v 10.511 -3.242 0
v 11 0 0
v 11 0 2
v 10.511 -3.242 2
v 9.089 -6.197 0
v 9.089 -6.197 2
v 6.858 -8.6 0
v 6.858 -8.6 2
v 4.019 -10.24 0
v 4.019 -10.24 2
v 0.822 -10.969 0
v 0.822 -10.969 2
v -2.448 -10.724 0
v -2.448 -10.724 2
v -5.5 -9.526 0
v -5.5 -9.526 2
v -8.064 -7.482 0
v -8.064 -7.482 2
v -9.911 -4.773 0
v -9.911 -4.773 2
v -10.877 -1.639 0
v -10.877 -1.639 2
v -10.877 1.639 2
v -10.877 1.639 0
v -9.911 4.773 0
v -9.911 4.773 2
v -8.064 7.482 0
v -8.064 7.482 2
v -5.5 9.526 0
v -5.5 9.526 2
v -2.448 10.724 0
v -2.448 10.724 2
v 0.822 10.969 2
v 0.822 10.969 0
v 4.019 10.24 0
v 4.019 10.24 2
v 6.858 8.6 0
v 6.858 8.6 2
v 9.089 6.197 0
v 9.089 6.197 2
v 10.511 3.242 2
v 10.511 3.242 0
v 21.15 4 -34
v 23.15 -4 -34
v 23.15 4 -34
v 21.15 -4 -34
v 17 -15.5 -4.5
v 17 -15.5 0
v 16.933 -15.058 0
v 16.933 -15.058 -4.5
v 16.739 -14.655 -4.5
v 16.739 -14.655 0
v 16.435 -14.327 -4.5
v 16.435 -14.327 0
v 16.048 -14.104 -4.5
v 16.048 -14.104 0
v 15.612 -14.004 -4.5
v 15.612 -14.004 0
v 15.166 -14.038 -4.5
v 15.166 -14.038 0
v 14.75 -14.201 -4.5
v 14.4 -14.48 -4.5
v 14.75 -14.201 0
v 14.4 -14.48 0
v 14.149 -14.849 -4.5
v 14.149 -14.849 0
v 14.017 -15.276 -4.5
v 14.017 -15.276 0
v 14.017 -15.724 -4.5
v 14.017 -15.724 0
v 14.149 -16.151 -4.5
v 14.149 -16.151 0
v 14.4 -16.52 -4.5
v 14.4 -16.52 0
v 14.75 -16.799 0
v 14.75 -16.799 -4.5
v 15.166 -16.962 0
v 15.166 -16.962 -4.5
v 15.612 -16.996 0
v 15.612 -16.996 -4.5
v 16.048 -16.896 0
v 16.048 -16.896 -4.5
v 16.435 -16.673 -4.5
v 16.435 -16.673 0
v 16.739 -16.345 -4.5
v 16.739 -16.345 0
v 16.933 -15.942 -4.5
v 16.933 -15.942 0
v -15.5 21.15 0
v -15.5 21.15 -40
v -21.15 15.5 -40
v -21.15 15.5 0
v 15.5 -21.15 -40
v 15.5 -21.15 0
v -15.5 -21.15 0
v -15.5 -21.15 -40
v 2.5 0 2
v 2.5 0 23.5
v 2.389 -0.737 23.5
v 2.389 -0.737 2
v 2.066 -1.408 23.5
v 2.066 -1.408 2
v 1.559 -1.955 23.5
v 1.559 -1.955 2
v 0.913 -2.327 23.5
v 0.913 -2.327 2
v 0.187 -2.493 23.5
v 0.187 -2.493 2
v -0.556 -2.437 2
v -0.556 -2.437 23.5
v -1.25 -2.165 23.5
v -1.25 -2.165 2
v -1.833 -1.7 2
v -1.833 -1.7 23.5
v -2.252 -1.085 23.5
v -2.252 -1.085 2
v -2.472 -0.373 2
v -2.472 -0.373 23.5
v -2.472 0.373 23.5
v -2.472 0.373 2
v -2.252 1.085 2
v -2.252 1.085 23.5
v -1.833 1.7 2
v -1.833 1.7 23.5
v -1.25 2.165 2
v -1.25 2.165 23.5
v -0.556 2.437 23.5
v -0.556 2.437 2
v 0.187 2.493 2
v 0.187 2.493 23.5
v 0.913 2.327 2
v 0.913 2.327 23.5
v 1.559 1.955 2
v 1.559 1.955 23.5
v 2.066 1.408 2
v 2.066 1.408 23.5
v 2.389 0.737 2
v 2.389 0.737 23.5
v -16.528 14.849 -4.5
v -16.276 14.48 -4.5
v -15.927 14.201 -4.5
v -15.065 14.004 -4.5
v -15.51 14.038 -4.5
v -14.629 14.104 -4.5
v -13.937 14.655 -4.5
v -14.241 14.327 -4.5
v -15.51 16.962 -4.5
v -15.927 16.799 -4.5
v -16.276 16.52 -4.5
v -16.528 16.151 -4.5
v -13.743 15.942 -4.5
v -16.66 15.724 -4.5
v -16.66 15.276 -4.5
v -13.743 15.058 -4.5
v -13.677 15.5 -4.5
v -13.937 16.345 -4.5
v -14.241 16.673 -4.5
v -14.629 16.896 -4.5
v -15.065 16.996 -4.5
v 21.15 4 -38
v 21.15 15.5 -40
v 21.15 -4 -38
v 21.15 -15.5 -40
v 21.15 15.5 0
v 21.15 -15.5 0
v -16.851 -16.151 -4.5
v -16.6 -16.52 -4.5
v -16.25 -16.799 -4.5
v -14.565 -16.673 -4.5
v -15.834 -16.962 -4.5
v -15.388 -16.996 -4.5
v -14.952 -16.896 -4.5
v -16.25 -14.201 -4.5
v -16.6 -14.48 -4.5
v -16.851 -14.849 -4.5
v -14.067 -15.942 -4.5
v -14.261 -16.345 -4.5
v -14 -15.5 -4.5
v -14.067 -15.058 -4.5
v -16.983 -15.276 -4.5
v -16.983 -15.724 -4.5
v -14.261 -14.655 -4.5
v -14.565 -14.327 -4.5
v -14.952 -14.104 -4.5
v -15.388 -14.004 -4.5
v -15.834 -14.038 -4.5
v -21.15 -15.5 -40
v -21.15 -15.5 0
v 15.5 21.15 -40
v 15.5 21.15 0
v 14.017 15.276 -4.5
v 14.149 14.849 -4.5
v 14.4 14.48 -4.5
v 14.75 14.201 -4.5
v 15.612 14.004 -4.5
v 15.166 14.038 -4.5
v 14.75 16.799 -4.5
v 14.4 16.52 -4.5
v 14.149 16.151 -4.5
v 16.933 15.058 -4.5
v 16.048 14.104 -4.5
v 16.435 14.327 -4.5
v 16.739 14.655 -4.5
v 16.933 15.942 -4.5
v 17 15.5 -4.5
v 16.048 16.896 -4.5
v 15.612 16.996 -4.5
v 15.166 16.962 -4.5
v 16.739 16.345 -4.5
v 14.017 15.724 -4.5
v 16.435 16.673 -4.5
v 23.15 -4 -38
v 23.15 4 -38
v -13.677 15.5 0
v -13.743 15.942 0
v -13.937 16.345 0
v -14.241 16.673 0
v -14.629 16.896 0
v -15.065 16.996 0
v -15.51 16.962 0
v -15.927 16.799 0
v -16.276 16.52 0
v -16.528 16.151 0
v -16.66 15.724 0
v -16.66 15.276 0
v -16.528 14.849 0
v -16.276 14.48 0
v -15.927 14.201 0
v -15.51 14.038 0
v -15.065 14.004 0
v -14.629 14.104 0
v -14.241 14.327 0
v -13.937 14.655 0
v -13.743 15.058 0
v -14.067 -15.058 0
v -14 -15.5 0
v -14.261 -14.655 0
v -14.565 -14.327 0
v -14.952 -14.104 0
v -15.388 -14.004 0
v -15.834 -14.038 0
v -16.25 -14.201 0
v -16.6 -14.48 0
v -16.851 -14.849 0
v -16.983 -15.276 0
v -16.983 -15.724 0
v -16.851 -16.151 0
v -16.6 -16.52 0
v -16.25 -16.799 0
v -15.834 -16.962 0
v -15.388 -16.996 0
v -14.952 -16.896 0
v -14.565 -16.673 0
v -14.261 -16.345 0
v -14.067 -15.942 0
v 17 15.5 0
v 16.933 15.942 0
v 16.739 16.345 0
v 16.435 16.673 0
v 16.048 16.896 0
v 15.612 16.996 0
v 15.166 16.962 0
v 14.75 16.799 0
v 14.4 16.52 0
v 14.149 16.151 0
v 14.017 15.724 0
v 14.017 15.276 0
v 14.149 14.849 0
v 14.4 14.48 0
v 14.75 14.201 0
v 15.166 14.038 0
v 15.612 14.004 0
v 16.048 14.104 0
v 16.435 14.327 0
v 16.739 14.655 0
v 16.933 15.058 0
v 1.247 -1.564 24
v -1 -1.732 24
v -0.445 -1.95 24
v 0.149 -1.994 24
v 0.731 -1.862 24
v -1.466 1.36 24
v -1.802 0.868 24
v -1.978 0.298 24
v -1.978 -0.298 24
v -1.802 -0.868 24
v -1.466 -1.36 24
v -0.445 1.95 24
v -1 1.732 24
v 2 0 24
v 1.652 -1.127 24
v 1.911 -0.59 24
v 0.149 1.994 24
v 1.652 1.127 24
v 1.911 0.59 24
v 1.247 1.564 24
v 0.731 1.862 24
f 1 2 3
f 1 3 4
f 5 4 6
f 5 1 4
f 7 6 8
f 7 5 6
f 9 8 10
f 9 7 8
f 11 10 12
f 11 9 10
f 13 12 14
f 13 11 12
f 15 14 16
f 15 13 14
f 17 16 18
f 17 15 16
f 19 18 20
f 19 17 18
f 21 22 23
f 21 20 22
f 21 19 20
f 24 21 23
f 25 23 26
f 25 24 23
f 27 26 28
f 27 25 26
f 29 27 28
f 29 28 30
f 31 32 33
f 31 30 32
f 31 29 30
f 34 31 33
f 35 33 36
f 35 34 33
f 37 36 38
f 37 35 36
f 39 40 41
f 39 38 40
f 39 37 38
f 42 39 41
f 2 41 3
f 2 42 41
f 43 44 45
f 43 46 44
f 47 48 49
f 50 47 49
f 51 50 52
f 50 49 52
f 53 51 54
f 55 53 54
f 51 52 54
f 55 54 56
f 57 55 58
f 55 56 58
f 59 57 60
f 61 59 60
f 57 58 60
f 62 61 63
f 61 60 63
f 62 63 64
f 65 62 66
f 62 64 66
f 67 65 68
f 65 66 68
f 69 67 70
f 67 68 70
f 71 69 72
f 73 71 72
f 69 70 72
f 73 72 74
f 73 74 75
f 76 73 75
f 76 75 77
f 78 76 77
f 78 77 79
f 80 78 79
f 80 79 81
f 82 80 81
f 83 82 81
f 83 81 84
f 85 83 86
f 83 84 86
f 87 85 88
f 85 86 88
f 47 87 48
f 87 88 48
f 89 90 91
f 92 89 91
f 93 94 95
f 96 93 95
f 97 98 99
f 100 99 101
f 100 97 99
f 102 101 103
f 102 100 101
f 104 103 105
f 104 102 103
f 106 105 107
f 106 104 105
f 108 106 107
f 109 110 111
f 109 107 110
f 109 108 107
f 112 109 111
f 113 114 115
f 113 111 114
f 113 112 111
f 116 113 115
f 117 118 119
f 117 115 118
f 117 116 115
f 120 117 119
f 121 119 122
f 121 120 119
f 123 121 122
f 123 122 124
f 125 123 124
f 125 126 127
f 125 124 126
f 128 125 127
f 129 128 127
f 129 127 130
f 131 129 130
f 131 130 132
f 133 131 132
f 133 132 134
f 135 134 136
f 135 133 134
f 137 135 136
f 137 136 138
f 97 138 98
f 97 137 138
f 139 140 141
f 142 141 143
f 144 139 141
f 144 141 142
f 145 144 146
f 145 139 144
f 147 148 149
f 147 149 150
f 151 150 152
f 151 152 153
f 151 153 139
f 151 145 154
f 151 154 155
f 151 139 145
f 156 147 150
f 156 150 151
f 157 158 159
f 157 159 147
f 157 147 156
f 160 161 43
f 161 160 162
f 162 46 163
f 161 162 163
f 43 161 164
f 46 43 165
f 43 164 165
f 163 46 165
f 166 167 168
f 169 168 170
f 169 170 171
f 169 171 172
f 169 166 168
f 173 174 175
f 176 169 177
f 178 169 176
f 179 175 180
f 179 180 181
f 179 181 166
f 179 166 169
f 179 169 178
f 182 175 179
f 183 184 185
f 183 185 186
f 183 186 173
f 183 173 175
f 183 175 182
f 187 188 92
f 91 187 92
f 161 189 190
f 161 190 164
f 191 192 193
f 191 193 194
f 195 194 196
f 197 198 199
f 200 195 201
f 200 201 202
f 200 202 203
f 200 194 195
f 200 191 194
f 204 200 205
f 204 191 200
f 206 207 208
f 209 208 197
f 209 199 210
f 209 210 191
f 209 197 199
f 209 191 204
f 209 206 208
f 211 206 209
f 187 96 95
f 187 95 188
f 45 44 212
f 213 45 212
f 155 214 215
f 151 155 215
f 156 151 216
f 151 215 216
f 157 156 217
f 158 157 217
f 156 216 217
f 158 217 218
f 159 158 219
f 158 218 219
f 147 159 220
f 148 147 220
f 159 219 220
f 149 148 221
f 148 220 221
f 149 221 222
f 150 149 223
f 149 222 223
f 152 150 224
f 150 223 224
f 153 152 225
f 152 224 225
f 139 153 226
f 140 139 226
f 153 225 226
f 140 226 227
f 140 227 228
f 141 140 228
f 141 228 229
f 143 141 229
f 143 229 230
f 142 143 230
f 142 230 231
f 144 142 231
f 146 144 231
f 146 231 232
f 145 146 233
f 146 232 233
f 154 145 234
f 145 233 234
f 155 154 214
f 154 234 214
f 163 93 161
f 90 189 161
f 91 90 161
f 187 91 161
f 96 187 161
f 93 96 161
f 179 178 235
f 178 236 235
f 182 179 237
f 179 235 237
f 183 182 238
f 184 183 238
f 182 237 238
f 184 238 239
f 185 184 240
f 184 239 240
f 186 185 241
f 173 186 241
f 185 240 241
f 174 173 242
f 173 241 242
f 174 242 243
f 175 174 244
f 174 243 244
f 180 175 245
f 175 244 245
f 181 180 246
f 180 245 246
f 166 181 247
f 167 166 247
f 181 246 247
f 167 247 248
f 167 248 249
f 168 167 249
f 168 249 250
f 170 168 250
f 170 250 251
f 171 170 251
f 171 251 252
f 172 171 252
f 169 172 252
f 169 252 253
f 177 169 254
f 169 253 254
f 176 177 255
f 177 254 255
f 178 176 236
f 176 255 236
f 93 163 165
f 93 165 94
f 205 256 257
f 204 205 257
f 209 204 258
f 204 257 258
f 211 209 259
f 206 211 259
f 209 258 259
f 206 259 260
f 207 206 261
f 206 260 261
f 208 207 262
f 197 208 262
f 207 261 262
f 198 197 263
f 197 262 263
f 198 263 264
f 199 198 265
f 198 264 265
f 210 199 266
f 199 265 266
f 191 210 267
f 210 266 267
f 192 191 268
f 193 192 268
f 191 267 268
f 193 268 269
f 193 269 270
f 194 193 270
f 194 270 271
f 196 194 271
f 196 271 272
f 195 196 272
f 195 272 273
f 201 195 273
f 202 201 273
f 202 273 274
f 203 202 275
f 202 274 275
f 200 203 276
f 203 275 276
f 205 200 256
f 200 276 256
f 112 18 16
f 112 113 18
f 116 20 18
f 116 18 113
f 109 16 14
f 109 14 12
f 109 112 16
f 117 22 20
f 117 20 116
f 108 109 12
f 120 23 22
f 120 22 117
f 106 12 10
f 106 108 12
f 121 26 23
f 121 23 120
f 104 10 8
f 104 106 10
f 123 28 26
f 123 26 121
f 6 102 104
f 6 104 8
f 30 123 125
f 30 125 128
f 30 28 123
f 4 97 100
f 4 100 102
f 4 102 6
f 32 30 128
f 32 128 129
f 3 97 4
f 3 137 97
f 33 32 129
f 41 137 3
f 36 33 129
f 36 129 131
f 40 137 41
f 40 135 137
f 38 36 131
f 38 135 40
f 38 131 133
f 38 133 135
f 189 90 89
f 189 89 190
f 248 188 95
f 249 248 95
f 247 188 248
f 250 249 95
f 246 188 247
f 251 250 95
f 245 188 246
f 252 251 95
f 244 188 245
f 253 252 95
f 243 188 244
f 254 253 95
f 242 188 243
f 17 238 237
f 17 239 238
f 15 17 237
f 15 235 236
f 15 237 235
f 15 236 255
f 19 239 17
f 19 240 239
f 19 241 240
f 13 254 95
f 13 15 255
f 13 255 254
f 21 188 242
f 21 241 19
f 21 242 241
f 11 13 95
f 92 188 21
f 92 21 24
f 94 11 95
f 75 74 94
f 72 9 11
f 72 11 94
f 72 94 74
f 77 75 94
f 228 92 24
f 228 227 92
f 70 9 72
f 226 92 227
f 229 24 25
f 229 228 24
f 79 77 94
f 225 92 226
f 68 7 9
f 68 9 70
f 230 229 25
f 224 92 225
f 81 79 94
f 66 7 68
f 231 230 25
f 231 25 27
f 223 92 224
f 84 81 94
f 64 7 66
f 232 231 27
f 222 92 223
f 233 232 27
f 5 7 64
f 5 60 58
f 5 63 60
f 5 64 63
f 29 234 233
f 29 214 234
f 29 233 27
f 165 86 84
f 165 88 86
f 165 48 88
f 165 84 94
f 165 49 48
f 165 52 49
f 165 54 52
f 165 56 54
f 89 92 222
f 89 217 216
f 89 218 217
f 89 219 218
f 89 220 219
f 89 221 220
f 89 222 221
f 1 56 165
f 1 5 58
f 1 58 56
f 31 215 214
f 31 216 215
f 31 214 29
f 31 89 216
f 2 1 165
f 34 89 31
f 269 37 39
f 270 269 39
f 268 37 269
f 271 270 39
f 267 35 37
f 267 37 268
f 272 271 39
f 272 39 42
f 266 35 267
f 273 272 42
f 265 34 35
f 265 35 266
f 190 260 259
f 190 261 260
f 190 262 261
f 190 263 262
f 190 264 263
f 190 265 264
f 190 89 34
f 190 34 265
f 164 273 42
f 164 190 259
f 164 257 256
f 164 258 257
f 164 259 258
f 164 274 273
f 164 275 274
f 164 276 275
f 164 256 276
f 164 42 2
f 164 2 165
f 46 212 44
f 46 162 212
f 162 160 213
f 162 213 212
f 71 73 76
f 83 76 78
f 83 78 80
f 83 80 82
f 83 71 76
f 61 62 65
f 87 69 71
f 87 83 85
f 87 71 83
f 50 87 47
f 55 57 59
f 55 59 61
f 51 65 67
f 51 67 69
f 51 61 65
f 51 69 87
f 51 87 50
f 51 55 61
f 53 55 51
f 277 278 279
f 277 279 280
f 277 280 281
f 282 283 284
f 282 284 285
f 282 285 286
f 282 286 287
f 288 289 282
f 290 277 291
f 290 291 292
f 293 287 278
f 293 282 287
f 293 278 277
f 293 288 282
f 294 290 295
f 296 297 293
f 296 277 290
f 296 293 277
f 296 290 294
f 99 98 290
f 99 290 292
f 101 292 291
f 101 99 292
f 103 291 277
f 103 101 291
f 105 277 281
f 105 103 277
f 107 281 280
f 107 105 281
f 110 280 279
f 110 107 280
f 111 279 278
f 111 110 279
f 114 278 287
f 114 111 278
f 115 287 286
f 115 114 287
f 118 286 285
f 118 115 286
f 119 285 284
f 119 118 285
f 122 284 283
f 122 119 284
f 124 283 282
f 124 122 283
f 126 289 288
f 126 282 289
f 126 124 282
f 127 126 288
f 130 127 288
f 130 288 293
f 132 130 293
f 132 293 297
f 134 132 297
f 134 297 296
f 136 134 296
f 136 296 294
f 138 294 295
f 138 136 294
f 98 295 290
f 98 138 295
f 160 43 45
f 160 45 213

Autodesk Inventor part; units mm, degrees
ref_plane "YZ Plane" through (0, 0, 0) normal (1, 0, 0) x (0, 1, 0)
ref_plane "XZ Plane" through (0, 0, 0) normal (0, 1, 0) x (-1, 0, 0)
ref_plane "XY Plane" through (0, 0, 0) normal (0, 0, 1) x (1, 0, 0)
sketch "Sketch1" plane through (0, 0, 0) normal (0, 0, 1) x (1, 0, 0)
  line L0 (15.5, -21.15) -> (-15.5, -21.15)
  line L1 (-21.15, -15.5) -> (-21.15, 15.5)
  line L2 (-15.5, 21.15) -> (15.5, 21.15)
  line L3 (21.15, 15.5) -> (21.15, -15.5)
  line L4 (21.15, -21.15) -> (-21.15, 21.15) construction
  line L5 (-21.15, -21.15) -> (21.15, 21.15) construction
  line L6 (-15.5, 21.15) -> (-21.15, 15.5)
  line L7 (-21.15, 0) -> (-21.15, 15.5)
  line L8 (0, 21.15) -> (-15.5, 21.15)
  line L9 (15.5, 21.15) -> (21.15, 15.5)
  line L10 (21.15, -15.5) -> (15.5, -21.15)
  line L11 (-15.5, -21.15) -> (-21.15, -15.5)
  point P0 (0, 0)
  dimension "d0" = 42.3
  dimension "d1" = 42.3
  dimension "d2" = 5.65
  dimension "d3" = 5.65
  dimension "d4" = 15.5
  dimension "d5" = 15.5
extrude "Extrusion1" add sketch "Sketch1" against normal blind 40
sketch "Sketch2" plane through (0, 0, 0) normal (0, 0, 1) x (1, 0, 0)
  circle A0 centre (0, 0) radius 11
  dimension "d8" = 22
extrude "Extrusion2" add sketch "Sketch2" along normal blind 2
sketch "Sketch3" plane through (0, 0, 0) normal (0, 0, 1) x (1, 0, 0)
  circle A0 centre (0, 0) radius 2.5
  dimension "d11" = 5
extrude "Extrusion3" add sketch "Sketch3" along normal blind 24
chamfer "Chamfer1" distance 0.5 angle 45 1 edges at (-2.5, 0, 24)
sketch "Sketch4" plane through (0, 0, 0) normal (0, 0, 1) x (1, 0, 0)
  line L0 (-21.15, 15.5) -> (-21.15, -15.5) projected
  line L1 (-15.5, 21.15) -> (-21.15, 15.5) projected
  circle A0 centre (-15.1766, 15.5) radius 1.5
  circle A1 centre (15.5, 15.5) radius 1.5
  circle A2 centre (-15.5, -15.5) radius 1.5
  circle A3 centre (15.5, -15.5) radius 1.5
  point P0 (0, 0)
  dimension "d18" = 3
  dimension "d19" = 3
  dimension "d20" = 3
  dimension "d21" = 3
extrude "Extrusion4" cut sketch "Sketch4" against normal blind 4.5
sketch "Sketch5" plane through (-15.5, -21.15, 0) normal (0, -1, 0) x (1, 0, 0)
  point P0 (15.5, 0)
sketch "Sketch6" plane through (21.15, -15.5, 0) normal (1, 0, 0) x (0, 0, -1)
  line L0 (40, 0) -> (40, 31) projected
  line L1 (38, 11.5) -> (34, 11.5)
  line L2 (34, 11.5) -> (34, 19.5)
  line L3 (34, 19.5) -> (38, 19.5)
  line L4 (38, 19.5) -> (38, 11.5)
  line L5 (38, 11.5) -> (34, 19.5) construction
  line L6 (34, 11.5) -> (38, 19.5) construction
  line L7 (0, 0) -> (40, 0) projected
  line L8 (0, 31) -> (40, 31) projected
  point P0 (0, 15.5)
  point P1 (40, 15.5)
  point P2 (36, 15.5)
  dimension "d24" = 4
  dimension "d25" = 8
  dimension "d26" = 2
  dimension "d29" = 15.5
  dimension "d30" = 31
extrude "Extrusion5" add sketch "Sketch6" along normal blind 2
equation "\"d3\" = d2"
equation "\"d29\" = 0.5 * d30"
properties part number "Motor BYGHW609"
